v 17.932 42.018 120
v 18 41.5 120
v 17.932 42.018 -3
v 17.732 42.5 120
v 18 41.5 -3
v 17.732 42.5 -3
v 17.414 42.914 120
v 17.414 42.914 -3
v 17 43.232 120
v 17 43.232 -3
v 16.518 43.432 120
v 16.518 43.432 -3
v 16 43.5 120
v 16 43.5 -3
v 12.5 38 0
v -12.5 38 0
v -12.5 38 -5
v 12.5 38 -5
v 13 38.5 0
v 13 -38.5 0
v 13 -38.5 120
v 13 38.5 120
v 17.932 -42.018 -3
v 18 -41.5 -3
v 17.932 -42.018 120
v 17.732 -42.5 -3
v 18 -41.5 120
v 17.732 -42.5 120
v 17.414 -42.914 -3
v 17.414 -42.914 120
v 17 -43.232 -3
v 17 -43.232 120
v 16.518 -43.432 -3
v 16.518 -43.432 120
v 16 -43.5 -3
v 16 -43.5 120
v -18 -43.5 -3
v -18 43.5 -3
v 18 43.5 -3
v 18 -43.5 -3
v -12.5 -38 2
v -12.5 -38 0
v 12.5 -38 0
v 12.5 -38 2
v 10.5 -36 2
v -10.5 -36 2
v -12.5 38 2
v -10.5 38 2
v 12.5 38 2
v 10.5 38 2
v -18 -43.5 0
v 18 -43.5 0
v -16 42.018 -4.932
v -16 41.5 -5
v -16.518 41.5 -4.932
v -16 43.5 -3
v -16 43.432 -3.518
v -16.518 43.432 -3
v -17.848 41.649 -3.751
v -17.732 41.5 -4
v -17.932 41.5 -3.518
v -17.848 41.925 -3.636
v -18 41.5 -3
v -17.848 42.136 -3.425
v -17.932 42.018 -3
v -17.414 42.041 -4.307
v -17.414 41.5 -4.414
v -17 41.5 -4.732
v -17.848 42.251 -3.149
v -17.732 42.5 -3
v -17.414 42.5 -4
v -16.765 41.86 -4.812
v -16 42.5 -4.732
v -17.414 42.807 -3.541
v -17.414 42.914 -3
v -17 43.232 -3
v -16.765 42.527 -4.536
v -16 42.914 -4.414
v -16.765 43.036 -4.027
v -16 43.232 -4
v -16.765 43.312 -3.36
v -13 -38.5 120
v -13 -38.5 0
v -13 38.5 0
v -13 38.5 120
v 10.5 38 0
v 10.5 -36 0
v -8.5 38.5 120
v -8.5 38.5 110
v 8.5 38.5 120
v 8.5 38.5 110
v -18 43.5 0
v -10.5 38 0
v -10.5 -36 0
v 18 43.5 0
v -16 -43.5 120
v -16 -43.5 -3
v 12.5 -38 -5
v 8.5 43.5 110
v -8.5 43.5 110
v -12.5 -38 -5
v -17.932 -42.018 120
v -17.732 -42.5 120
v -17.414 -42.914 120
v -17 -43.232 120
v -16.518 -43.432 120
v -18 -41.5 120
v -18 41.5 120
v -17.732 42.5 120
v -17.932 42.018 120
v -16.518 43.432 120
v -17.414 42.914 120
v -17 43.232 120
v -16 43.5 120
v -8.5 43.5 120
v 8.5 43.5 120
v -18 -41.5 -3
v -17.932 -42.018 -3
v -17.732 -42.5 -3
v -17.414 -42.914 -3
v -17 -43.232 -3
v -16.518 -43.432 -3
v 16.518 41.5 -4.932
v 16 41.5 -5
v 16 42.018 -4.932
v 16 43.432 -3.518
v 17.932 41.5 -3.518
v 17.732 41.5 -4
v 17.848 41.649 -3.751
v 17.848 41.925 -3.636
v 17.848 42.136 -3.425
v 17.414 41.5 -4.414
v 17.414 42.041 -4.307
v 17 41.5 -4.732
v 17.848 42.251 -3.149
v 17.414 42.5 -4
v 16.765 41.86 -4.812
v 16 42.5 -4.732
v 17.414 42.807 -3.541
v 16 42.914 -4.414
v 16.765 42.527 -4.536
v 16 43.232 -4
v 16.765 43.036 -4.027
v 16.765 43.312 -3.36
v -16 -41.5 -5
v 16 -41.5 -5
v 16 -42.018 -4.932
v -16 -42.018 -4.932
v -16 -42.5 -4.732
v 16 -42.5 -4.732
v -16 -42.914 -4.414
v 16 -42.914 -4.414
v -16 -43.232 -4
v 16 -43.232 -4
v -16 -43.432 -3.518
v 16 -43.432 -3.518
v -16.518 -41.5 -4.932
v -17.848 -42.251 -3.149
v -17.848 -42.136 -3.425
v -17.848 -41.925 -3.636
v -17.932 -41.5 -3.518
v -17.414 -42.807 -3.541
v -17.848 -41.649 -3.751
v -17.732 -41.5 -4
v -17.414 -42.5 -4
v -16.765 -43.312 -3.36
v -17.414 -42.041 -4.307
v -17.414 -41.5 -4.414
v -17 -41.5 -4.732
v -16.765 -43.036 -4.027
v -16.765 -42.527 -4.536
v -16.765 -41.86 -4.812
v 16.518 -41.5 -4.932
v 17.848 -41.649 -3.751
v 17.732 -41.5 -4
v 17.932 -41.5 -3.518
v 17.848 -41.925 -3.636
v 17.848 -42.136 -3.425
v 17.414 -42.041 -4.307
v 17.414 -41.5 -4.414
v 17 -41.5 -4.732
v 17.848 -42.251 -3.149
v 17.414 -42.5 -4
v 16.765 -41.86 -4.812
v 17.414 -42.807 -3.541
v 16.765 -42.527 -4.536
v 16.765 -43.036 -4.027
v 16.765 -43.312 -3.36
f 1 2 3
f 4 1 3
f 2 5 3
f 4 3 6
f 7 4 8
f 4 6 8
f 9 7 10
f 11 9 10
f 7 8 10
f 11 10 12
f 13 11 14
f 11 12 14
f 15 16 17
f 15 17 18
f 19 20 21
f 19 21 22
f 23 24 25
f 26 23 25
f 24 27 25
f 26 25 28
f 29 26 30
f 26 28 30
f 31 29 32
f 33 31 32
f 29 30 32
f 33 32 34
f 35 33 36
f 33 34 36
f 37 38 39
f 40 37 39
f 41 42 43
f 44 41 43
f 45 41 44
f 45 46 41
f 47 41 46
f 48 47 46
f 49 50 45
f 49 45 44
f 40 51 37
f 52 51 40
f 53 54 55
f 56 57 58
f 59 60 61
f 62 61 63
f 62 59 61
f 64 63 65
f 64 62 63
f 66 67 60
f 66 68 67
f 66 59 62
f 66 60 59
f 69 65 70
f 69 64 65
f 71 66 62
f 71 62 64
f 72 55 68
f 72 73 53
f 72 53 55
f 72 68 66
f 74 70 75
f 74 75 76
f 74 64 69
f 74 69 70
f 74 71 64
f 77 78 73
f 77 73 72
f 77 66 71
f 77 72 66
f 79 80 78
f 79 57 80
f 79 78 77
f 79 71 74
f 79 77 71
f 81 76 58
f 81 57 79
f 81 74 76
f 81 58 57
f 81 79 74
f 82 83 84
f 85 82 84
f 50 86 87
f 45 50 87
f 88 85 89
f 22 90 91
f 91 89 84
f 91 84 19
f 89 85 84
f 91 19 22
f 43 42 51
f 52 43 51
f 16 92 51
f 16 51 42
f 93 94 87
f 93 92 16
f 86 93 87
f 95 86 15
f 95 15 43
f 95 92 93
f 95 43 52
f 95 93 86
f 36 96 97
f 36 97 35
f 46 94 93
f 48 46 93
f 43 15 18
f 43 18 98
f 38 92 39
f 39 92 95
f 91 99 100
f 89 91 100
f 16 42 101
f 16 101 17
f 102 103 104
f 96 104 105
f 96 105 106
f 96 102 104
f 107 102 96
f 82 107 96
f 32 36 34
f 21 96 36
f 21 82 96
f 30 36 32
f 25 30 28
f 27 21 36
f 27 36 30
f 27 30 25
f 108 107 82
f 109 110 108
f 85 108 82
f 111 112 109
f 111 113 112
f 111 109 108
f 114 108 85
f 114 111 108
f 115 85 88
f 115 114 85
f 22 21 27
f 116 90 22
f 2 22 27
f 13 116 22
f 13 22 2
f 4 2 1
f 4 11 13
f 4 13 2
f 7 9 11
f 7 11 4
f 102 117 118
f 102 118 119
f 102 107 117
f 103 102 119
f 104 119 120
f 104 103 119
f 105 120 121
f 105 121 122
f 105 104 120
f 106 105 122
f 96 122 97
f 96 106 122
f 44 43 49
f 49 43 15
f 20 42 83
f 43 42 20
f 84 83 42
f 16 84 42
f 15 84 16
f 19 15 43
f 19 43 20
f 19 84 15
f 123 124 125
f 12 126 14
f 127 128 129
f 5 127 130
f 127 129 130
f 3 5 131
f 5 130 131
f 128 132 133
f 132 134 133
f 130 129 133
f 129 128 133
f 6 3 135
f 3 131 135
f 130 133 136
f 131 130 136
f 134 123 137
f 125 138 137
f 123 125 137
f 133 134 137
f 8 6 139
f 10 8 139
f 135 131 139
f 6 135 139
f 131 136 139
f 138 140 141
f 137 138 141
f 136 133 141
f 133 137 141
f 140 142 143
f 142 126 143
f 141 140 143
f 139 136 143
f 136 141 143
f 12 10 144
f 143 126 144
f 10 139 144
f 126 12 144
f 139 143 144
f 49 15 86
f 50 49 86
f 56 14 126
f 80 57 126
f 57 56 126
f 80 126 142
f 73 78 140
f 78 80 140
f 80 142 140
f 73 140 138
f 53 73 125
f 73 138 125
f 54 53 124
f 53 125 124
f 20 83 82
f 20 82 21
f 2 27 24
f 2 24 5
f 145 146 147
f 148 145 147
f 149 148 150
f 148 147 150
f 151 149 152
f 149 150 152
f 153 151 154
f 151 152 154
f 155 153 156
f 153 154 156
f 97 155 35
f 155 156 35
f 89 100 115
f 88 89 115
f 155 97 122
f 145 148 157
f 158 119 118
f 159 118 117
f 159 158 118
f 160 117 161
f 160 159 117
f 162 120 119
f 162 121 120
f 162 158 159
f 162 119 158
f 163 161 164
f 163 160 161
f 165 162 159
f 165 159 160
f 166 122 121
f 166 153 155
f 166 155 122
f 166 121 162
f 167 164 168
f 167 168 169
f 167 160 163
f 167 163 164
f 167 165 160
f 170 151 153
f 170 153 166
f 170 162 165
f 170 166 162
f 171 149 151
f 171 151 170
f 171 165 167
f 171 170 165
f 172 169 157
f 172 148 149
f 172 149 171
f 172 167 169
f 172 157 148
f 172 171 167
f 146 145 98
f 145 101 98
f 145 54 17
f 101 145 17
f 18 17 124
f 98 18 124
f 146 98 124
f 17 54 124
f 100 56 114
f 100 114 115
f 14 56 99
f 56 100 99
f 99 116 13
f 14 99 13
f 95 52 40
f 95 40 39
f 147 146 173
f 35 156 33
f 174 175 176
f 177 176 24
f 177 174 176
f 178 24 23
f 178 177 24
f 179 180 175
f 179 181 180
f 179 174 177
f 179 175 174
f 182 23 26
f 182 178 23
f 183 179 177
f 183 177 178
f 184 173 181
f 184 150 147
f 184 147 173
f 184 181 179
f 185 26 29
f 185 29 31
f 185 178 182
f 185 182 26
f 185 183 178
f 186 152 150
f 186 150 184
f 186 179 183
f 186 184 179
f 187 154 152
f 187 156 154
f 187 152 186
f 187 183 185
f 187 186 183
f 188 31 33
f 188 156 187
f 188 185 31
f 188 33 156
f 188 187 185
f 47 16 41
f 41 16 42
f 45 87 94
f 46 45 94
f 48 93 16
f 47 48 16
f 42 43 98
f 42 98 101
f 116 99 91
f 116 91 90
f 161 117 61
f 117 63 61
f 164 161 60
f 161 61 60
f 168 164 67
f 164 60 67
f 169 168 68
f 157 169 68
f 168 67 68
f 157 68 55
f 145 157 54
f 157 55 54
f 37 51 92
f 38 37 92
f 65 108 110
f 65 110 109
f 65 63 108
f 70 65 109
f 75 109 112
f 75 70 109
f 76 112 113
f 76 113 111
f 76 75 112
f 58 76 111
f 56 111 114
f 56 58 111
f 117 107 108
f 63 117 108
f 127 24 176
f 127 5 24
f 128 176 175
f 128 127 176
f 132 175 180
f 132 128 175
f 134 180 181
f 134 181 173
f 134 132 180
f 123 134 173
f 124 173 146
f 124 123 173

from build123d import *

# Parameters (mm, degrees)
F0_W     = 35.9999979138
F0_H     = 86.9999979138
F0_W_2   = 26
F0_H_2   = 77
F1_DEPTH = 120
F2_DEPTH = 5
F3_R     = 2
F5_W     = 17
F5_H     = 10
F6_DEPTH = 25
F7_DEPTH = 2
F0_W_3   = 21
F0_H_3   = 74
F8_DEPTH = 3


with BuildPart() as f1:
    # F0 (on Top) → F1 (new body)
    with BuildSketch(Plane.XY):
        Rectangle(F0_W, F0_H)
        Rectangle(F0_W_2, F0_H_2, mode=Mode.SUBTRACT)
    extrude(amount=F1_DEPTH)

    # F0 (on Top) → F2 (join)
    with BuildSketch(Plane.XY):
        Rectangle(F0_W, F0_H)
        Rectangle(F0_W_2, F0_H_2, mode=Mode.SUBTRACT)
        Rectangle(F0_W_2, F0_H_2)
        Polygon((12.5, 38), (12.5, -38), (-12.5, -38), (-12.5, 38), (-10.5, 38), (10.5, 38), align=None, mode=Mode.SUBTRACT)
    extrude(amount=-F2_DEPTH)

    # F3
    f3_edges = [f1.edges().sort_by_distance(p)[0] for p in [
        (0, 43.499999, -5),
        (0, -43.499999, -5),
        (-17.999999, -43.499999, 57.5),
        (17.999999, 0, -5),
        (17.999999, -43.499999, 57.5),
        (17.999999, 43.499999, 57.5),
        (-17.999999, 0, -5),
        (-17.999999, 43.499999, 57.5),
    ]]
    fillet(f3_edges, radius=F3_R)

    # F5 (on face) → F6 (cut)
    with BuildSketch(Plane(origin=(0, 43.4999989569, 0), x_dir=(-1, 0, 0), z_dir=(0, 1, 0))):
        with Locations((0, 115)):
            Rectangle(F5_W, F5_H)
    extrude(amount=-F6_DEPTH, mode=Mode.SUBTRACT)


with BuildPart() as f7:
    # F0 (on Top) → F7 (new body)
    with BuildSketch(Plane.XY):
        Polygon((-12.5, -38), (12.5, -38), (12.5, 38), (10.5, 38), (10.5, -36), (-10.5, -36), (-10.5, 38), (-12.5, 38), align=None)
    extrude(amount=F7_DEPTH)

    # F0 (on Top) → F8 (join)
    with BuildSketch(Plane.XY):
        Rectangle(F0_W, F0_H)
        Rectangle(F0_W_2, F0_H_2, mode=Mode.SUBTRACT)
        Rectangle(F0_W_2, F0_H_2)
        Polygon((12.5, 38), (12.5, -38), (-12.5, -38), (-12.5, 38), (-10.5, 38), (10.5, 38), align=None, mode=Mode.SUBTRACT)
        with Locations((0, 1)):
            Rectangle(F0_W_3, F0_H_3)
        Polygon((-12.5, -38), (12.5, -38), (12.5, 38), (10.5, 38), (10.5, -36), (-10.5, -36), (-10.5, 38), (-12.5, 38), align=None)
    extrude(amount=-F8_DEPTH)


solid = Compound([f1.part, f7.part])
